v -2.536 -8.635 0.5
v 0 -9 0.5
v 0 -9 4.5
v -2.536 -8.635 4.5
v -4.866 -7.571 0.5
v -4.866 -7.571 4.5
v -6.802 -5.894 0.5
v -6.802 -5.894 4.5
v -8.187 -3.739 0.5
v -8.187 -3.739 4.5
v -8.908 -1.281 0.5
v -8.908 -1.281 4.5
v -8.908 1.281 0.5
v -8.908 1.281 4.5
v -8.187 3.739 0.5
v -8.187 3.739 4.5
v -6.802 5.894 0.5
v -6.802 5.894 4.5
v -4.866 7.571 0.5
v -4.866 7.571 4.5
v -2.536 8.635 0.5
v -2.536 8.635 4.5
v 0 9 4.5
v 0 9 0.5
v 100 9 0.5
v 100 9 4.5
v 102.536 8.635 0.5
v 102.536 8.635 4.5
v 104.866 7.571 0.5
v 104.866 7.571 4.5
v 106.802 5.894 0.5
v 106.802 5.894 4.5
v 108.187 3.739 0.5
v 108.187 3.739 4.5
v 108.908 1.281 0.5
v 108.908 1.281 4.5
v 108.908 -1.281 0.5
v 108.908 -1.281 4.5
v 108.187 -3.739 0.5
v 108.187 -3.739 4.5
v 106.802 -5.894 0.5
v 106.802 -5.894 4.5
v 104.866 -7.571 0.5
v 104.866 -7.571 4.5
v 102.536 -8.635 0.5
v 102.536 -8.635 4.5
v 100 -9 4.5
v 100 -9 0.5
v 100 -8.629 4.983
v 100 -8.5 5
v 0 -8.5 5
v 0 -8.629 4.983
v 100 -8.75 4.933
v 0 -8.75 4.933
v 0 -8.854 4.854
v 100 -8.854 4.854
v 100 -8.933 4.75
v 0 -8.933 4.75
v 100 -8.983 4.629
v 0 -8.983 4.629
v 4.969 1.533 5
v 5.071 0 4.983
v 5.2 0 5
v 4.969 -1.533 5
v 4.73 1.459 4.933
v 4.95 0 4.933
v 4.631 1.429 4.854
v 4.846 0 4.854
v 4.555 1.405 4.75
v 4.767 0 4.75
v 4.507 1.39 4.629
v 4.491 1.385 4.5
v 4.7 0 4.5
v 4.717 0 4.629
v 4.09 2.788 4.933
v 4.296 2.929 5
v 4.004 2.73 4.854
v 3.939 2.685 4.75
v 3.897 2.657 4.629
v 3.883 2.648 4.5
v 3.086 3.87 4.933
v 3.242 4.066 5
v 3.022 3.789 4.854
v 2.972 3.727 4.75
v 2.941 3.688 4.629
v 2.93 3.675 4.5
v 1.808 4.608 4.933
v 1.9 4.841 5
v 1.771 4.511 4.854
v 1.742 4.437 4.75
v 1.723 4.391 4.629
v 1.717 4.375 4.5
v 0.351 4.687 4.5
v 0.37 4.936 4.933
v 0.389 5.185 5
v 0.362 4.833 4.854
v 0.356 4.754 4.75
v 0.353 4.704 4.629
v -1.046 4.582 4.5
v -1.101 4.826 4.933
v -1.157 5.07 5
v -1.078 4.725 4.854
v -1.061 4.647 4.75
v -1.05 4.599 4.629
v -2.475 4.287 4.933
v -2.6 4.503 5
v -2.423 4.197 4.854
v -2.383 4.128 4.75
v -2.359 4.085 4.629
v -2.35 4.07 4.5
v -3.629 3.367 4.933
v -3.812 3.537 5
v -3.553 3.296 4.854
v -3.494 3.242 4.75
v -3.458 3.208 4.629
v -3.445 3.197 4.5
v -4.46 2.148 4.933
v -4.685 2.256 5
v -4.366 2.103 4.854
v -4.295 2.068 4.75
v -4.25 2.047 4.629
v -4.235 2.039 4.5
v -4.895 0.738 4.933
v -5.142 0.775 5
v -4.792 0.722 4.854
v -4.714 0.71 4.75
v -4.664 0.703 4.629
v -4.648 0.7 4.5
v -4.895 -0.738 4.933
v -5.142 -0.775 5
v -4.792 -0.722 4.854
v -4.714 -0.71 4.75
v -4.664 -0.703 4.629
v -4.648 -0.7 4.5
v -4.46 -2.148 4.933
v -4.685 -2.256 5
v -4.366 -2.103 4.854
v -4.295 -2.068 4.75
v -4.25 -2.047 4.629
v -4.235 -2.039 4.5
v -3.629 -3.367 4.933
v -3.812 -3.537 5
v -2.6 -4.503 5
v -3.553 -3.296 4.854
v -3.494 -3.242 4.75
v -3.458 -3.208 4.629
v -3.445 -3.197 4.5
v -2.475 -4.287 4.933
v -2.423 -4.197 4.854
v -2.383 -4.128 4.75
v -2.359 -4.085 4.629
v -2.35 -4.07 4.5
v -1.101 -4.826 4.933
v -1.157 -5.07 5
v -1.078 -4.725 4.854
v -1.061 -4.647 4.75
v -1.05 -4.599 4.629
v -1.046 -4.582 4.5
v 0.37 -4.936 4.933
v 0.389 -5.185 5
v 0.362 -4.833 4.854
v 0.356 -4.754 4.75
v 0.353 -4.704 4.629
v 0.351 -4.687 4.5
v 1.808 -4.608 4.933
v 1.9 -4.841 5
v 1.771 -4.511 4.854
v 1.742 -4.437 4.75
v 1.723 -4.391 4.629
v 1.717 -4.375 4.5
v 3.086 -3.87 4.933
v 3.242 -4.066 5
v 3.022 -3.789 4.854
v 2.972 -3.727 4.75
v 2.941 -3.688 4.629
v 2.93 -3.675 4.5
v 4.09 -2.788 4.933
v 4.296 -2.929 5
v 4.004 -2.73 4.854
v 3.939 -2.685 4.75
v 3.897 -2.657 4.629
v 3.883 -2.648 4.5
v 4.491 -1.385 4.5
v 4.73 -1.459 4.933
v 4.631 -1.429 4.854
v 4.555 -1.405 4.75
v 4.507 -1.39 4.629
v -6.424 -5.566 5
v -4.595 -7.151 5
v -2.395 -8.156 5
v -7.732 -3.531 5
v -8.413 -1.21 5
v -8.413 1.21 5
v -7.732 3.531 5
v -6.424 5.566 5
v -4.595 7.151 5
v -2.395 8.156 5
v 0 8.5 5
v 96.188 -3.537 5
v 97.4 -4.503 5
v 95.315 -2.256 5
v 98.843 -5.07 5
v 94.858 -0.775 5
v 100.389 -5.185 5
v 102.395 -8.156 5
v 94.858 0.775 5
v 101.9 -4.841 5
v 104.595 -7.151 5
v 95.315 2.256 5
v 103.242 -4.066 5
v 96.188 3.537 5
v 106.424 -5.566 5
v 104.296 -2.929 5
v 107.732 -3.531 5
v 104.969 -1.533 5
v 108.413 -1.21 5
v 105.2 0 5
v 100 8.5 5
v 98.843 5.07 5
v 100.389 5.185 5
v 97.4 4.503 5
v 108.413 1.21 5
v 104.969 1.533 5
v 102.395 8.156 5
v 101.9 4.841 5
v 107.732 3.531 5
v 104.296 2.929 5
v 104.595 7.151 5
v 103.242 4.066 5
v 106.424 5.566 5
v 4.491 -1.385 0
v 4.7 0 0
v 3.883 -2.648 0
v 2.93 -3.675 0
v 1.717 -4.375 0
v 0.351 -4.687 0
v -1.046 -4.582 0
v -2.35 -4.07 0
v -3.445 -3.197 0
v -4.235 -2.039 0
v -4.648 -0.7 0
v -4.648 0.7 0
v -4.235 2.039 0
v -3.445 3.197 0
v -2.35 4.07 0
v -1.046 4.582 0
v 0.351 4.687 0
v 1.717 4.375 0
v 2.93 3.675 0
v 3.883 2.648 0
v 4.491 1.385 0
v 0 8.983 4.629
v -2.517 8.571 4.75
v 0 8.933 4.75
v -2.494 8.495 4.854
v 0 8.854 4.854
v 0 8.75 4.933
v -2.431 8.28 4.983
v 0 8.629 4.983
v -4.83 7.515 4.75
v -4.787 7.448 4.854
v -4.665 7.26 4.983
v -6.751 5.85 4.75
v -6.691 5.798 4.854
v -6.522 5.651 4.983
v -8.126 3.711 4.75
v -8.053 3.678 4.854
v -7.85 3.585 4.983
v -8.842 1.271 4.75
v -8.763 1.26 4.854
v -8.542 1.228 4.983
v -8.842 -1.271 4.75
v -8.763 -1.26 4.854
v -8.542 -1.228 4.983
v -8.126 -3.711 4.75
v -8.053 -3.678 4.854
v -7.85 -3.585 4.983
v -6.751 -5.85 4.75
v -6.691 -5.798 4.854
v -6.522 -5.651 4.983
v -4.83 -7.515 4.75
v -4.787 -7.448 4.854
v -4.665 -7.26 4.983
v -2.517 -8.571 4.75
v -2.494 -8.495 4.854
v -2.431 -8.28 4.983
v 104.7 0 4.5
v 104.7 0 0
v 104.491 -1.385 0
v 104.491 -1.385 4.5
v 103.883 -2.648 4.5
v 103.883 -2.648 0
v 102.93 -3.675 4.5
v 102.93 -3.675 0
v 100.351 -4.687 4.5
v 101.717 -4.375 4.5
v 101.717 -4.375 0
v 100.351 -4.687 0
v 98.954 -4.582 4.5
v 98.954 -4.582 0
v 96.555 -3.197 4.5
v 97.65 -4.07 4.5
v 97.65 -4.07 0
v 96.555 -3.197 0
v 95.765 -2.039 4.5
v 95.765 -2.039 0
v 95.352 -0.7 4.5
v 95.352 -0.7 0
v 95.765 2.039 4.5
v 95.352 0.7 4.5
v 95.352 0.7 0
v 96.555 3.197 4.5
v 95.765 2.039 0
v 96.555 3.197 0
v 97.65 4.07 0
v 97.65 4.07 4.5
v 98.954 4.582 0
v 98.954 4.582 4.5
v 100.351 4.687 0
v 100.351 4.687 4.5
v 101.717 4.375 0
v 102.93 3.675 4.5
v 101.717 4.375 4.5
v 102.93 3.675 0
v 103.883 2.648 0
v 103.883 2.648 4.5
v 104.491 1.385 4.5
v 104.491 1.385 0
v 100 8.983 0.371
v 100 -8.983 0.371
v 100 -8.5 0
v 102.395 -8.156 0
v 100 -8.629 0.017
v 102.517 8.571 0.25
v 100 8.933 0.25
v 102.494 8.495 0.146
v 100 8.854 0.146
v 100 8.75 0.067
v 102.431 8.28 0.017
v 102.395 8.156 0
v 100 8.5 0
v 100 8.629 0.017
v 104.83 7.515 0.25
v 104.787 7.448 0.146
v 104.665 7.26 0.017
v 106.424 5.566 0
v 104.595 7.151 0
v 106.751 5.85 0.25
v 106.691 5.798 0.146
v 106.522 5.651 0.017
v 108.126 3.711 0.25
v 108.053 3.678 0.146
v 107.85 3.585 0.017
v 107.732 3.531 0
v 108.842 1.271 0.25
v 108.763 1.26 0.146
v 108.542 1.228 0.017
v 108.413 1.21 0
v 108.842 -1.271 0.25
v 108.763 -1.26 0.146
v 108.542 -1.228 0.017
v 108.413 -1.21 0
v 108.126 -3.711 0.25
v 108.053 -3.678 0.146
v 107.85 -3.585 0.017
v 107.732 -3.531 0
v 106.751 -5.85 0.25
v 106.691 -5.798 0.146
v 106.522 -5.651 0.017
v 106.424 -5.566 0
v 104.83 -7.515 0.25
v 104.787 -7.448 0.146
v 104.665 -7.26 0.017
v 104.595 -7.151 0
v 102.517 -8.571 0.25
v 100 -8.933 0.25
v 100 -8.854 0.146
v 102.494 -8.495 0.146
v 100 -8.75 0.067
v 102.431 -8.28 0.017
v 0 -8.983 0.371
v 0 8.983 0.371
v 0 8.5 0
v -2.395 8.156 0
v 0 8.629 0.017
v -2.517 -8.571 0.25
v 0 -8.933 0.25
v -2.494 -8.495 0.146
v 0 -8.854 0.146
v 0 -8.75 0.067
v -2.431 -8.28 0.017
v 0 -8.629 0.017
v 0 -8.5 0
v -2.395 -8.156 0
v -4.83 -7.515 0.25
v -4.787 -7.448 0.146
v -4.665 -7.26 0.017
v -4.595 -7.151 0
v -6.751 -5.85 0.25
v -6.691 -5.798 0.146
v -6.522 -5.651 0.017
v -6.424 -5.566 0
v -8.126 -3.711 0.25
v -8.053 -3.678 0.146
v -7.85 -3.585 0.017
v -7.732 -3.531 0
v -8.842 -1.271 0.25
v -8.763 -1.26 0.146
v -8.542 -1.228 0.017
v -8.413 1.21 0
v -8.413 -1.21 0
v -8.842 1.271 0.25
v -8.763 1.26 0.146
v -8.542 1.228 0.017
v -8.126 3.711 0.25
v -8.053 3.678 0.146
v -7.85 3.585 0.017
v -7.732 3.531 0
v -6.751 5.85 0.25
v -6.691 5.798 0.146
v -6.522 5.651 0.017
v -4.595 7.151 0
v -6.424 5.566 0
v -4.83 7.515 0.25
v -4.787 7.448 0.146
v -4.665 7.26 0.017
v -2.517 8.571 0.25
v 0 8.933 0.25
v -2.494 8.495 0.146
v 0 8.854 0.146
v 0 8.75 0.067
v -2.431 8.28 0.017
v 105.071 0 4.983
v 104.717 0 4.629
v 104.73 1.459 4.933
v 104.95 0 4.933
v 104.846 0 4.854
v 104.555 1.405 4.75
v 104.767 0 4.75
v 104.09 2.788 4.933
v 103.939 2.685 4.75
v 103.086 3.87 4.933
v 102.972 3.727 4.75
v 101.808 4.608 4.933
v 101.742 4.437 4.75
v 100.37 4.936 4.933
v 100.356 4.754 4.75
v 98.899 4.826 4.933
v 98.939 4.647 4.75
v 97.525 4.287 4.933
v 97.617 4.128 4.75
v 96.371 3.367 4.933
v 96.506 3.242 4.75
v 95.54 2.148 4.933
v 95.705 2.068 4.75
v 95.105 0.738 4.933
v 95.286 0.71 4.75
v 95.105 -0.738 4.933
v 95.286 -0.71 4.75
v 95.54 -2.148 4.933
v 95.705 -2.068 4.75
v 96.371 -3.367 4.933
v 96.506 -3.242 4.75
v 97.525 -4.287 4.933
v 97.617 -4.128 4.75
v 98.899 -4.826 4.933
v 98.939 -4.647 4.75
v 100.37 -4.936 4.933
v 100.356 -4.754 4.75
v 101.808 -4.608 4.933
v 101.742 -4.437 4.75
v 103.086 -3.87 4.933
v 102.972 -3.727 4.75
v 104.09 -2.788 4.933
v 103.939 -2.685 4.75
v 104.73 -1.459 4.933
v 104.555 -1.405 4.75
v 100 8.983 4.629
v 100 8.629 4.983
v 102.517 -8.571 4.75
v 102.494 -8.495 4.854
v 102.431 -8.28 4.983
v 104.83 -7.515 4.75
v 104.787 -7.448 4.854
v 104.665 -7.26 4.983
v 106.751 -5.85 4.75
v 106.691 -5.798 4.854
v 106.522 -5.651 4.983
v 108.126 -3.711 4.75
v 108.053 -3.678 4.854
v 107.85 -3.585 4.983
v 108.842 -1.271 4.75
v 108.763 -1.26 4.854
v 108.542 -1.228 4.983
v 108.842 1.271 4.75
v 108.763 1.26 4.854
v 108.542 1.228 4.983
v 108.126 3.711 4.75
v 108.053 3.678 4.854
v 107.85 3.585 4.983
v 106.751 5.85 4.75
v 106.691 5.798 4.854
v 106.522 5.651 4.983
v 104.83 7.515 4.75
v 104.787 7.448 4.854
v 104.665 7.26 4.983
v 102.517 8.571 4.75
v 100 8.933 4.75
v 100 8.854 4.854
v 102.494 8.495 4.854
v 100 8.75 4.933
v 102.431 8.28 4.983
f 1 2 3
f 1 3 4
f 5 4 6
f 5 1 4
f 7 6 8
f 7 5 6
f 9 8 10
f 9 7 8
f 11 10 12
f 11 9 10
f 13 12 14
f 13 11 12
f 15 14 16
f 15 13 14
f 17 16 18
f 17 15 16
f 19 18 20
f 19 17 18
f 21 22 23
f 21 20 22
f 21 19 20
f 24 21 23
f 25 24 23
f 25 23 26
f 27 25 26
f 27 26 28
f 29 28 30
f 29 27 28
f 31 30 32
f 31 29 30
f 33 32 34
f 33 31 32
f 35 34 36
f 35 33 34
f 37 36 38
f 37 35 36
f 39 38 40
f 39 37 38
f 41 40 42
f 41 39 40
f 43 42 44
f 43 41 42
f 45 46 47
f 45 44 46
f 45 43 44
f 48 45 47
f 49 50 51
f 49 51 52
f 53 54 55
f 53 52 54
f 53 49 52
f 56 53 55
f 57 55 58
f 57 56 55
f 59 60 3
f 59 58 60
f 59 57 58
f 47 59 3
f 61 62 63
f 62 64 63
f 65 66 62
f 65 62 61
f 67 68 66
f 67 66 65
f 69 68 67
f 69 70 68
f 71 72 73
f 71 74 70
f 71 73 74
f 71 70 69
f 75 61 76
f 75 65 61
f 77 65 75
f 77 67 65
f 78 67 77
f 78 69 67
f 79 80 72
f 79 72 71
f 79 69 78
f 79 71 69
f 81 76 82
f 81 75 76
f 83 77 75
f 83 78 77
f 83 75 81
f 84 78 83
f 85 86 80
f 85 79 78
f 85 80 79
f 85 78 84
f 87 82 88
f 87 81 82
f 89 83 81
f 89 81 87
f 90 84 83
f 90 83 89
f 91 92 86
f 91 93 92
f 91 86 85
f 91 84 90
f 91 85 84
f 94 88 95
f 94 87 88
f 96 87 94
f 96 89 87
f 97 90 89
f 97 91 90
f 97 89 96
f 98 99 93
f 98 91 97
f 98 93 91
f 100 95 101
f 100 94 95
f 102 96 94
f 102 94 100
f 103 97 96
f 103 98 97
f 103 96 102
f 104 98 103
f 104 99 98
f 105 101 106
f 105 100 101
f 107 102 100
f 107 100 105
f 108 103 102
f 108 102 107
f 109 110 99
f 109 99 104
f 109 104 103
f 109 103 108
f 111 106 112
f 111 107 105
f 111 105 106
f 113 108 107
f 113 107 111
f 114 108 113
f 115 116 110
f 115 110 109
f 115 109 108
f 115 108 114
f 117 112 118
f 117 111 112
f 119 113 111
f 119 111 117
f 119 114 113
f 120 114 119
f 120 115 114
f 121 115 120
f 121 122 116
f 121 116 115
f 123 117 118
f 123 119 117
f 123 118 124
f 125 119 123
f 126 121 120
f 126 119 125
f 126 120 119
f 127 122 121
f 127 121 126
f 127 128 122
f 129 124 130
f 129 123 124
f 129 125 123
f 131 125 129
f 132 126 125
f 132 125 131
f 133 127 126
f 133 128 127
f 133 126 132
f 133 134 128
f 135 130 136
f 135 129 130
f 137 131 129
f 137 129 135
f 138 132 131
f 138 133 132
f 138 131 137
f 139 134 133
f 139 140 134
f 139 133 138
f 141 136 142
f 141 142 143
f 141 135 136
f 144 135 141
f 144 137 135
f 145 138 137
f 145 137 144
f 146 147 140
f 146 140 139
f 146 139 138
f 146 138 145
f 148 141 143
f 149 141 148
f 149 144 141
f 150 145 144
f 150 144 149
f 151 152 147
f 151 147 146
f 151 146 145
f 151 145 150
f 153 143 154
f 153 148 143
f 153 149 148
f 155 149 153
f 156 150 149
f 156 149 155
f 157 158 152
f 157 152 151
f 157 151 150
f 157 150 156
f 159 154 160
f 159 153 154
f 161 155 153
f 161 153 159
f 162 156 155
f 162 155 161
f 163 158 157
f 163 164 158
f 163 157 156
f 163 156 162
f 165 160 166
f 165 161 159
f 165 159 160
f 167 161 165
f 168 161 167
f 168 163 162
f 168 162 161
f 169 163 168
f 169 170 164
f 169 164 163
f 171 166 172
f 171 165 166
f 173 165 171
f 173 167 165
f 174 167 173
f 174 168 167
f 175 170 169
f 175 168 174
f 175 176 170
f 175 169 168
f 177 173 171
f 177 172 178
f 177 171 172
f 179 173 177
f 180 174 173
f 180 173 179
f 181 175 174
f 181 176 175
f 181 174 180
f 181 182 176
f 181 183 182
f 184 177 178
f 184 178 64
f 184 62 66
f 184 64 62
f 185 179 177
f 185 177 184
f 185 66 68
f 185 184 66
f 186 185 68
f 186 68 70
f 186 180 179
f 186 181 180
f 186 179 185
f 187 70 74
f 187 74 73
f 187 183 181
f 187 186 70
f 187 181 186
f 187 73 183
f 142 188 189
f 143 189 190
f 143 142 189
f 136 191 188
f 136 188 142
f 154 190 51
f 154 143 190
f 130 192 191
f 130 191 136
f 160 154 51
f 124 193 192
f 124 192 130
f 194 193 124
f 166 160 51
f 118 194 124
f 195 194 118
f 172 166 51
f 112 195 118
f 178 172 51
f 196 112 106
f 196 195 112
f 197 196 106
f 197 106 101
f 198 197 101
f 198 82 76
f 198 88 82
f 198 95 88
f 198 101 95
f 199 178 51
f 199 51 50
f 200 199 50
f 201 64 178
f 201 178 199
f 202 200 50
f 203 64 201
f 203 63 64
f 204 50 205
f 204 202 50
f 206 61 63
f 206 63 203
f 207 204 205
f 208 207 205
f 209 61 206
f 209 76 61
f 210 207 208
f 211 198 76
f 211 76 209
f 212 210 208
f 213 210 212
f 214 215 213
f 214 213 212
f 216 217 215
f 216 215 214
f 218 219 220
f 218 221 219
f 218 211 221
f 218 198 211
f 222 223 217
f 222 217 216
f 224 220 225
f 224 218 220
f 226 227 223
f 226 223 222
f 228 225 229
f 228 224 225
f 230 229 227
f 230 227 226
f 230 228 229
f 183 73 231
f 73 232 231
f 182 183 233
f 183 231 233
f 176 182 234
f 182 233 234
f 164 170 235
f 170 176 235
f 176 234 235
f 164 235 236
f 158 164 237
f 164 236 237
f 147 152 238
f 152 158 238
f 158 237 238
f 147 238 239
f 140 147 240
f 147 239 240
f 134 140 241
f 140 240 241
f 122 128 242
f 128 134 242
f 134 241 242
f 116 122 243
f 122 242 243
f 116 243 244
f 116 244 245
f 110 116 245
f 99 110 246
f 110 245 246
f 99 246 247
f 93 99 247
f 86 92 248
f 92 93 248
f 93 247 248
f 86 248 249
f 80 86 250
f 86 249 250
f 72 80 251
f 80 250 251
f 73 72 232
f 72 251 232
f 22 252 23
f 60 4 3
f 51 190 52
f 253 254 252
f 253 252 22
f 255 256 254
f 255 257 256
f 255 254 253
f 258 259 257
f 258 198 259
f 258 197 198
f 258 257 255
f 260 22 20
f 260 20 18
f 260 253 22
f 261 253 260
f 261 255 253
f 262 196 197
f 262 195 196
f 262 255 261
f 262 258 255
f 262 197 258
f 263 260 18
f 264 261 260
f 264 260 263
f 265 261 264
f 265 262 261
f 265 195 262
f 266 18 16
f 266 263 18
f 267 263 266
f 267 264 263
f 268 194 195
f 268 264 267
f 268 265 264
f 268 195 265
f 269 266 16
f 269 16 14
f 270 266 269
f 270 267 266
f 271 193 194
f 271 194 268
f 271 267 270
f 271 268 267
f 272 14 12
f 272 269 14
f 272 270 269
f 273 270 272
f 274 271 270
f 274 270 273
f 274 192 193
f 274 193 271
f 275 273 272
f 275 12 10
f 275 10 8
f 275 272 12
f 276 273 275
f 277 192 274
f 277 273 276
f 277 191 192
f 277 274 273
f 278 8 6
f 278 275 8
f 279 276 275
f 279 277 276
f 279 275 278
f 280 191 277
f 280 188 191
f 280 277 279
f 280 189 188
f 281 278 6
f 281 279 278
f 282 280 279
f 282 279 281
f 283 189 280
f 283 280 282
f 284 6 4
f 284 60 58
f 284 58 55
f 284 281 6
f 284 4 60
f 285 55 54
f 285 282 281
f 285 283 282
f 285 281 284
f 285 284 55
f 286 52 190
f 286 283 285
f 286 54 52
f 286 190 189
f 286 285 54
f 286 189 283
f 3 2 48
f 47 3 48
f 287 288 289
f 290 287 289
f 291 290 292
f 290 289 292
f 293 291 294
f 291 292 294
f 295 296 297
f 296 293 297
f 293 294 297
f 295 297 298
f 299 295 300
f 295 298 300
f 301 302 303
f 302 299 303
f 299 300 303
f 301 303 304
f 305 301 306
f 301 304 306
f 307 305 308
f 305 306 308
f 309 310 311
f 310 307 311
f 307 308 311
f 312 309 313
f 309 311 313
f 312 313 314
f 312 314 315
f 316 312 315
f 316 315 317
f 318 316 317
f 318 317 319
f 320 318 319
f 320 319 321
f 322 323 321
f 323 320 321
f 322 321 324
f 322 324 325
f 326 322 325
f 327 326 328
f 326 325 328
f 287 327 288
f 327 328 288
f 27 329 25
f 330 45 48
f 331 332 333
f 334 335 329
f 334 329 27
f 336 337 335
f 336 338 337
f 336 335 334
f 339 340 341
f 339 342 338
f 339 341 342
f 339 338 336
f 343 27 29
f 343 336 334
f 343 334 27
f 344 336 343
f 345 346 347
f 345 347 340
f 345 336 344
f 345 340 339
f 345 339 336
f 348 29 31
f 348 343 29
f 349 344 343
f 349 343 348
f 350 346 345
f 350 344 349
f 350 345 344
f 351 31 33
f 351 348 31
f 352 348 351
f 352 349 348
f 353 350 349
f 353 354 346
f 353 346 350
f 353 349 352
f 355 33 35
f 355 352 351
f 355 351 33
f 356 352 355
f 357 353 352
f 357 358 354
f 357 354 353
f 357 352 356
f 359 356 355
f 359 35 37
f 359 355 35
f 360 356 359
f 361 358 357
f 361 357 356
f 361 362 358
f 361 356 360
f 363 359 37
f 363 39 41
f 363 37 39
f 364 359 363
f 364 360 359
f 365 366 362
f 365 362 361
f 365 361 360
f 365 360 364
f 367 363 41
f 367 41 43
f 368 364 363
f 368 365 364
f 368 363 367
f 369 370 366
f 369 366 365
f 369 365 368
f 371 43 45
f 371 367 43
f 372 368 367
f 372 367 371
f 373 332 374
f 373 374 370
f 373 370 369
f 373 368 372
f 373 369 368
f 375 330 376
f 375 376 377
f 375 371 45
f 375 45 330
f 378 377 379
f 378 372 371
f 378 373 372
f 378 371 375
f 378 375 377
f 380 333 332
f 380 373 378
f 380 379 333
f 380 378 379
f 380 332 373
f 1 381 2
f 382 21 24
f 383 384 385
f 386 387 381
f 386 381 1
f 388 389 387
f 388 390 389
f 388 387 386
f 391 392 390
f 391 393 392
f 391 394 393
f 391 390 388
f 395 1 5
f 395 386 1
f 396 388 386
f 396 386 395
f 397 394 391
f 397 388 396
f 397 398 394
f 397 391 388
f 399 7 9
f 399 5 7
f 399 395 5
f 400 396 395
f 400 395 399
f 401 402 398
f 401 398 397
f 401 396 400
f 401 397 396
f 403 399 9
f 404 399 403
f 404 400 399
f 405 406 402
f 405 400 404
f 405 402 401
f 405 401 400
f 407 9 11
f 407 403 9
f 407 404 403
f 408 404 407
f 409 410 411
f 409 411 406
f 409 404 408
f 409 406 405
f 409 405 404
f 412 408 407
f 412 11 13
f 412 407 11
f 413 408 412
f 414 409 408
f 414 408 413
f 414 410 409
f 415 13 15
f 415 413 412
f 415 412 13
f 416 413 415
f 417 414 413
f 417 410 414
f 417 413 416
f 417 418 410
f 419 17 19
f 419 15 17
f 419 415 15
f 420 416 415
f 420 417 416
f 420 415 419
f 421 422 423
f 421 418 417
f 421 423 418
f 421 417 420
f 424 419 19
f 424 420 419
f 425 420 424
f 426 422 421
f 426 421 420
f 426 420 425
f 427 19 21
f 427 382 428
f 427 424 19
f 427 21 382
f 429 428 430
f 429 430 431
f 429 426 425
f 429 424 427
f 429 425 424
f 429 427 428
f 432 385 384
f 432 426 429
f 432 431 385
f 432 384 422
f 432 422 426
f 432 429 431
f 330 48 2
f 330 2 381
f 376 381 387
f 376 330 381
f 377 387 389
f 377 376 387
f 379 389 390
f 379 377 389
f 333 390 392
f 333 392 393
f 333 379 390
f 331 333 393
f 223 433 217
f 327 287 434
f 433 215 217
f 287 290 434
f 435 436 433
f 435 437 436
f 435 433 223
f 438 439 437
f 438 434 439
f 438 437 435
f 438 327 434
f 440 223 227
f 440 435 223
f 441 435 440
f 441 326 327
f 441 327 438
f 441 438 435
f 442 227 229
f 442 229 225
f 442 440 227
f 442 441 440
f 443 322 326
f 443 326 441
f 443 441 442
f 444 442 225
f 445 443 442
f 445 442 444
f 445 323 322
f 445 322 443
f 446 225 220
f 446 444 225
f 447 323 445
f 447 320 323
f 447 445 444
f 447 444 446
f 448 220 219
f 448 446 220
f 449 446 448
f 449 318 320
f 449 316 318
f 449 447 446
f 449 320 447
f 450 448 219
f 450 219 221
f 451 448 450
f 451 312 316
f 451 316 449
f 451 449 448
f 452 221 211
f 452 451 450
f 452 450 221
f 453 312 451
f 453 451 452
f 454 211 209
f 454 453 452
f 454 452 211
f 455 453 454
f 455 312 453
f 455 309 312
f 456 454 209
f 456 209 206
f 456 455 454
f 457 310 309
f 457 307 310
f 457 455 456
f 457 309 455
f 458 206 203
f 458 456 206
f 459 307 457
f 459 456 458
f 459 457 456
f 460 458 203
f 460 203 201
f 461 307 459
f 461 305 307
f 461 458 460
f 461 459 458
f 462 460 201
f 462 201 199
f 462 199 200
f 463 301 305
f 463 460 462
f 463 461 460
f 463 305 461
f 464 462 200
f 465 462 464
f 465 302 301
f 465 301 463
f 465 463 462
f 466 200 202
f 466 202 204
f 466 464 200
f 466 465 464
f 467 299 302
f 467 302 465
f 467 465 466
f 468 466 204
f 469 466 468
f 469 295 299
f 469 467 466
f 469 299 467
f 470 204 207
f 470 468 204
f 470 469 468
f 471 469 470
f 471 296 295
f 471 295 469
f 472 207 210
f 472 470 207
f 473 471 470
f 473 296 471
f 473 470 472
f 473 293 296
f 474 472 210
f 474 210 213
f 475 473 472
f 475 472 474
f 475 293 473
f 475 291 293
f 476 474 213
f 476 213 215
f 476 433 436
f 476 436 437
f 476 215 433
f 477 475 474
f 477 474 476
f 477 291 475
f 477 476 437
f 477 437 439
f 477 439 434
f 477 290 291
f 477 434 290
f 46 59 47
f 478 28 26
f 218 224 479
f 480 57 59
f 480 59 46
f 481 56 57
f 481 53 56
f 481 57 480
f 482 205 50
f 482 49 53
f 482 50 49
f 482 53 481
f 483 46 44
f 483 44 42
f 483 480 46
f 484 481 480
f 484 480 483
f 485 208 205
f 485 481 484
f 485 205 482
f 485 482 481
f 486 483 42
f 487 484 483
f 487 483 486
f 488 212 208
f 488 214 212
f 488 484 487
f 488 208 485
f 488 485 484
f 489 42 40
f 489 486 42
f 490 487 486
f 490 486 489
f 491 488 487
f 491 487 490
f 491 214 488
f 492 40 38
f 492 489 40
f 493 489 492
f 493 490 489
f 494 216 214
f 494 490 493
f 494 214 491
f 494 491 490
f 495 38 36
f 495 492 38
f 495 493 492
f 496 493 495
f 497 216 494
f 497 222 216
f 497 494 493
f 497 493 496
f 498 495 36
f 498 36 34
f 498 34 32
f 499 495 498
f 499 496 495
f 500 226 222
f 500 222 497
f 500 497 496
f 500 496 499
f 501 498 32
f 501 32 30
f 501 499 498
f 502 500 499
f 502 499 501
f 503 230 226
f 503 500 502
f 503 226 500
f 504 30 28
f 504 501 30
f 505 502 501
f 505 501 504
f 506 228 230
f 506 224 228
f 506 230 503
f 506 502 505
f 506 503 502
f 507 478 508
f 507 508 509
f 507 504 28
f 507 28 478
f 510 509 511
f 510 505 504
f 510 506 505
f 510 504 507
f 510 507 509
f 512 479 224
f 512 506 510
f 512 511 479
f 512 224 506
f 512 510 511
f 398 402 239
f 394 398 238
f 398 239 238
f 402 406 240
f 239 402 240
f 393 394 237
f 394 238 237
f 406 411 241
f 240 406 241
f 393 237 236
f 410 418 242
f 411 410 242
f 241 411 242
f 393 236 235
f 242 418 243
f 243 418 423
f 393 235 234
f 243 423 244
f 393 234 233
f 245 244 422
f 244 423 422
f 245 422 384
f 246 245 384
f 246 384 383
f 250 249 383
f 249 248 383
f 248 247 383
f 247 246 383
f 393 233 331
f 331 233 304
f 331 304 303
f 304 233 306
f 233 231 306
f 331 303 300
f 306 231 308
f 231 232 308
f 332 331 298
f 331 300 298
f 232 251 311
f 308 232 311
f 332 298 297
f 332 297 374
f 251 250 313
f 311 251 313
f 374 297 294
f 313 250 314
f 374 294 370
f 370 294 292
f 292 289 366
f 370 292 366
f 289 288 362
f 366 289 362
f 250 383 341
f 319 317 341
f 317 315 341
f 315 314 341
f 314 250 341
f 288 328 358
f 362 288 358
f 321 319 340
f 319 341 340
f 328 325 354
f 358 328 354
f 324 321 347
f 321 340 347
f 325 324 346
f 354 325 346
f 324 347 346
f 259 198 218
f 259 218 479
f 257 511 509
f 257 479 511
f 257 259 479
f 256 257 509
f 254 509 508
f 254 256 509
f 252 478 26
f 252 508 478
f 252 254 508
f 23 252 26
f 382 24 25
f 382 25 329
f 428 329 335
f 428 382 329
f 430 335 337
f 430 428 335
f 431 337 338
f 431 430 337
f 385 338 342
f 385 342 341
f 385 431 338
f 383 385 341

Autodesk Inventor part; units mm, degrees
ref_plane "YZ Plane" through (0, 0, 0) normal (1, 0, 0) x (0, 1, 0)
ref_plane "XZ Plane" through (0, 0, 0) normal (0, 1, 0) x (-1, 0, 0)
ref_plane "XY Plane" through (0, 0, 0) normal (0, 0, 1) x (1, 0, 0)
sketch "Sketch1" plane through (0, 0, 0) normal (0, 0, 1) x (1, 0, 0)
  circle A0 centre (0, 0) radius 4.7
  circle A1 centre (100, 0) radius 4.7
  circle A2 centre (0, 0) radius 9
  circle A3 centre (100, 0) radius 9
  line L0 (0, 9) -> (100, 9)
  line L1 (0, -9) -> (100, -9)
  dimension "d0" = 9.4
  dimension "d2" = 9.4
  dimension "d3" = 18
  dimension "d4" = 18
extrude "Extrusion1" add sketch "Sketch1" along normal blind 5
fillet "Fillet1" radius 0.5 8 edges at (50, -9, 5) (109, 0, 5) (50, 9, 5) (-9, 0, 5) (50, -9, 0) (109, 0, 0) (50, 9, 0) (-9, 0, 0)
fillet "Fillet2" radius 0.5 2 edges at (-4.7, 0, 5) (95.3, 0, 5)
properties part number "Arm Link Cross"
